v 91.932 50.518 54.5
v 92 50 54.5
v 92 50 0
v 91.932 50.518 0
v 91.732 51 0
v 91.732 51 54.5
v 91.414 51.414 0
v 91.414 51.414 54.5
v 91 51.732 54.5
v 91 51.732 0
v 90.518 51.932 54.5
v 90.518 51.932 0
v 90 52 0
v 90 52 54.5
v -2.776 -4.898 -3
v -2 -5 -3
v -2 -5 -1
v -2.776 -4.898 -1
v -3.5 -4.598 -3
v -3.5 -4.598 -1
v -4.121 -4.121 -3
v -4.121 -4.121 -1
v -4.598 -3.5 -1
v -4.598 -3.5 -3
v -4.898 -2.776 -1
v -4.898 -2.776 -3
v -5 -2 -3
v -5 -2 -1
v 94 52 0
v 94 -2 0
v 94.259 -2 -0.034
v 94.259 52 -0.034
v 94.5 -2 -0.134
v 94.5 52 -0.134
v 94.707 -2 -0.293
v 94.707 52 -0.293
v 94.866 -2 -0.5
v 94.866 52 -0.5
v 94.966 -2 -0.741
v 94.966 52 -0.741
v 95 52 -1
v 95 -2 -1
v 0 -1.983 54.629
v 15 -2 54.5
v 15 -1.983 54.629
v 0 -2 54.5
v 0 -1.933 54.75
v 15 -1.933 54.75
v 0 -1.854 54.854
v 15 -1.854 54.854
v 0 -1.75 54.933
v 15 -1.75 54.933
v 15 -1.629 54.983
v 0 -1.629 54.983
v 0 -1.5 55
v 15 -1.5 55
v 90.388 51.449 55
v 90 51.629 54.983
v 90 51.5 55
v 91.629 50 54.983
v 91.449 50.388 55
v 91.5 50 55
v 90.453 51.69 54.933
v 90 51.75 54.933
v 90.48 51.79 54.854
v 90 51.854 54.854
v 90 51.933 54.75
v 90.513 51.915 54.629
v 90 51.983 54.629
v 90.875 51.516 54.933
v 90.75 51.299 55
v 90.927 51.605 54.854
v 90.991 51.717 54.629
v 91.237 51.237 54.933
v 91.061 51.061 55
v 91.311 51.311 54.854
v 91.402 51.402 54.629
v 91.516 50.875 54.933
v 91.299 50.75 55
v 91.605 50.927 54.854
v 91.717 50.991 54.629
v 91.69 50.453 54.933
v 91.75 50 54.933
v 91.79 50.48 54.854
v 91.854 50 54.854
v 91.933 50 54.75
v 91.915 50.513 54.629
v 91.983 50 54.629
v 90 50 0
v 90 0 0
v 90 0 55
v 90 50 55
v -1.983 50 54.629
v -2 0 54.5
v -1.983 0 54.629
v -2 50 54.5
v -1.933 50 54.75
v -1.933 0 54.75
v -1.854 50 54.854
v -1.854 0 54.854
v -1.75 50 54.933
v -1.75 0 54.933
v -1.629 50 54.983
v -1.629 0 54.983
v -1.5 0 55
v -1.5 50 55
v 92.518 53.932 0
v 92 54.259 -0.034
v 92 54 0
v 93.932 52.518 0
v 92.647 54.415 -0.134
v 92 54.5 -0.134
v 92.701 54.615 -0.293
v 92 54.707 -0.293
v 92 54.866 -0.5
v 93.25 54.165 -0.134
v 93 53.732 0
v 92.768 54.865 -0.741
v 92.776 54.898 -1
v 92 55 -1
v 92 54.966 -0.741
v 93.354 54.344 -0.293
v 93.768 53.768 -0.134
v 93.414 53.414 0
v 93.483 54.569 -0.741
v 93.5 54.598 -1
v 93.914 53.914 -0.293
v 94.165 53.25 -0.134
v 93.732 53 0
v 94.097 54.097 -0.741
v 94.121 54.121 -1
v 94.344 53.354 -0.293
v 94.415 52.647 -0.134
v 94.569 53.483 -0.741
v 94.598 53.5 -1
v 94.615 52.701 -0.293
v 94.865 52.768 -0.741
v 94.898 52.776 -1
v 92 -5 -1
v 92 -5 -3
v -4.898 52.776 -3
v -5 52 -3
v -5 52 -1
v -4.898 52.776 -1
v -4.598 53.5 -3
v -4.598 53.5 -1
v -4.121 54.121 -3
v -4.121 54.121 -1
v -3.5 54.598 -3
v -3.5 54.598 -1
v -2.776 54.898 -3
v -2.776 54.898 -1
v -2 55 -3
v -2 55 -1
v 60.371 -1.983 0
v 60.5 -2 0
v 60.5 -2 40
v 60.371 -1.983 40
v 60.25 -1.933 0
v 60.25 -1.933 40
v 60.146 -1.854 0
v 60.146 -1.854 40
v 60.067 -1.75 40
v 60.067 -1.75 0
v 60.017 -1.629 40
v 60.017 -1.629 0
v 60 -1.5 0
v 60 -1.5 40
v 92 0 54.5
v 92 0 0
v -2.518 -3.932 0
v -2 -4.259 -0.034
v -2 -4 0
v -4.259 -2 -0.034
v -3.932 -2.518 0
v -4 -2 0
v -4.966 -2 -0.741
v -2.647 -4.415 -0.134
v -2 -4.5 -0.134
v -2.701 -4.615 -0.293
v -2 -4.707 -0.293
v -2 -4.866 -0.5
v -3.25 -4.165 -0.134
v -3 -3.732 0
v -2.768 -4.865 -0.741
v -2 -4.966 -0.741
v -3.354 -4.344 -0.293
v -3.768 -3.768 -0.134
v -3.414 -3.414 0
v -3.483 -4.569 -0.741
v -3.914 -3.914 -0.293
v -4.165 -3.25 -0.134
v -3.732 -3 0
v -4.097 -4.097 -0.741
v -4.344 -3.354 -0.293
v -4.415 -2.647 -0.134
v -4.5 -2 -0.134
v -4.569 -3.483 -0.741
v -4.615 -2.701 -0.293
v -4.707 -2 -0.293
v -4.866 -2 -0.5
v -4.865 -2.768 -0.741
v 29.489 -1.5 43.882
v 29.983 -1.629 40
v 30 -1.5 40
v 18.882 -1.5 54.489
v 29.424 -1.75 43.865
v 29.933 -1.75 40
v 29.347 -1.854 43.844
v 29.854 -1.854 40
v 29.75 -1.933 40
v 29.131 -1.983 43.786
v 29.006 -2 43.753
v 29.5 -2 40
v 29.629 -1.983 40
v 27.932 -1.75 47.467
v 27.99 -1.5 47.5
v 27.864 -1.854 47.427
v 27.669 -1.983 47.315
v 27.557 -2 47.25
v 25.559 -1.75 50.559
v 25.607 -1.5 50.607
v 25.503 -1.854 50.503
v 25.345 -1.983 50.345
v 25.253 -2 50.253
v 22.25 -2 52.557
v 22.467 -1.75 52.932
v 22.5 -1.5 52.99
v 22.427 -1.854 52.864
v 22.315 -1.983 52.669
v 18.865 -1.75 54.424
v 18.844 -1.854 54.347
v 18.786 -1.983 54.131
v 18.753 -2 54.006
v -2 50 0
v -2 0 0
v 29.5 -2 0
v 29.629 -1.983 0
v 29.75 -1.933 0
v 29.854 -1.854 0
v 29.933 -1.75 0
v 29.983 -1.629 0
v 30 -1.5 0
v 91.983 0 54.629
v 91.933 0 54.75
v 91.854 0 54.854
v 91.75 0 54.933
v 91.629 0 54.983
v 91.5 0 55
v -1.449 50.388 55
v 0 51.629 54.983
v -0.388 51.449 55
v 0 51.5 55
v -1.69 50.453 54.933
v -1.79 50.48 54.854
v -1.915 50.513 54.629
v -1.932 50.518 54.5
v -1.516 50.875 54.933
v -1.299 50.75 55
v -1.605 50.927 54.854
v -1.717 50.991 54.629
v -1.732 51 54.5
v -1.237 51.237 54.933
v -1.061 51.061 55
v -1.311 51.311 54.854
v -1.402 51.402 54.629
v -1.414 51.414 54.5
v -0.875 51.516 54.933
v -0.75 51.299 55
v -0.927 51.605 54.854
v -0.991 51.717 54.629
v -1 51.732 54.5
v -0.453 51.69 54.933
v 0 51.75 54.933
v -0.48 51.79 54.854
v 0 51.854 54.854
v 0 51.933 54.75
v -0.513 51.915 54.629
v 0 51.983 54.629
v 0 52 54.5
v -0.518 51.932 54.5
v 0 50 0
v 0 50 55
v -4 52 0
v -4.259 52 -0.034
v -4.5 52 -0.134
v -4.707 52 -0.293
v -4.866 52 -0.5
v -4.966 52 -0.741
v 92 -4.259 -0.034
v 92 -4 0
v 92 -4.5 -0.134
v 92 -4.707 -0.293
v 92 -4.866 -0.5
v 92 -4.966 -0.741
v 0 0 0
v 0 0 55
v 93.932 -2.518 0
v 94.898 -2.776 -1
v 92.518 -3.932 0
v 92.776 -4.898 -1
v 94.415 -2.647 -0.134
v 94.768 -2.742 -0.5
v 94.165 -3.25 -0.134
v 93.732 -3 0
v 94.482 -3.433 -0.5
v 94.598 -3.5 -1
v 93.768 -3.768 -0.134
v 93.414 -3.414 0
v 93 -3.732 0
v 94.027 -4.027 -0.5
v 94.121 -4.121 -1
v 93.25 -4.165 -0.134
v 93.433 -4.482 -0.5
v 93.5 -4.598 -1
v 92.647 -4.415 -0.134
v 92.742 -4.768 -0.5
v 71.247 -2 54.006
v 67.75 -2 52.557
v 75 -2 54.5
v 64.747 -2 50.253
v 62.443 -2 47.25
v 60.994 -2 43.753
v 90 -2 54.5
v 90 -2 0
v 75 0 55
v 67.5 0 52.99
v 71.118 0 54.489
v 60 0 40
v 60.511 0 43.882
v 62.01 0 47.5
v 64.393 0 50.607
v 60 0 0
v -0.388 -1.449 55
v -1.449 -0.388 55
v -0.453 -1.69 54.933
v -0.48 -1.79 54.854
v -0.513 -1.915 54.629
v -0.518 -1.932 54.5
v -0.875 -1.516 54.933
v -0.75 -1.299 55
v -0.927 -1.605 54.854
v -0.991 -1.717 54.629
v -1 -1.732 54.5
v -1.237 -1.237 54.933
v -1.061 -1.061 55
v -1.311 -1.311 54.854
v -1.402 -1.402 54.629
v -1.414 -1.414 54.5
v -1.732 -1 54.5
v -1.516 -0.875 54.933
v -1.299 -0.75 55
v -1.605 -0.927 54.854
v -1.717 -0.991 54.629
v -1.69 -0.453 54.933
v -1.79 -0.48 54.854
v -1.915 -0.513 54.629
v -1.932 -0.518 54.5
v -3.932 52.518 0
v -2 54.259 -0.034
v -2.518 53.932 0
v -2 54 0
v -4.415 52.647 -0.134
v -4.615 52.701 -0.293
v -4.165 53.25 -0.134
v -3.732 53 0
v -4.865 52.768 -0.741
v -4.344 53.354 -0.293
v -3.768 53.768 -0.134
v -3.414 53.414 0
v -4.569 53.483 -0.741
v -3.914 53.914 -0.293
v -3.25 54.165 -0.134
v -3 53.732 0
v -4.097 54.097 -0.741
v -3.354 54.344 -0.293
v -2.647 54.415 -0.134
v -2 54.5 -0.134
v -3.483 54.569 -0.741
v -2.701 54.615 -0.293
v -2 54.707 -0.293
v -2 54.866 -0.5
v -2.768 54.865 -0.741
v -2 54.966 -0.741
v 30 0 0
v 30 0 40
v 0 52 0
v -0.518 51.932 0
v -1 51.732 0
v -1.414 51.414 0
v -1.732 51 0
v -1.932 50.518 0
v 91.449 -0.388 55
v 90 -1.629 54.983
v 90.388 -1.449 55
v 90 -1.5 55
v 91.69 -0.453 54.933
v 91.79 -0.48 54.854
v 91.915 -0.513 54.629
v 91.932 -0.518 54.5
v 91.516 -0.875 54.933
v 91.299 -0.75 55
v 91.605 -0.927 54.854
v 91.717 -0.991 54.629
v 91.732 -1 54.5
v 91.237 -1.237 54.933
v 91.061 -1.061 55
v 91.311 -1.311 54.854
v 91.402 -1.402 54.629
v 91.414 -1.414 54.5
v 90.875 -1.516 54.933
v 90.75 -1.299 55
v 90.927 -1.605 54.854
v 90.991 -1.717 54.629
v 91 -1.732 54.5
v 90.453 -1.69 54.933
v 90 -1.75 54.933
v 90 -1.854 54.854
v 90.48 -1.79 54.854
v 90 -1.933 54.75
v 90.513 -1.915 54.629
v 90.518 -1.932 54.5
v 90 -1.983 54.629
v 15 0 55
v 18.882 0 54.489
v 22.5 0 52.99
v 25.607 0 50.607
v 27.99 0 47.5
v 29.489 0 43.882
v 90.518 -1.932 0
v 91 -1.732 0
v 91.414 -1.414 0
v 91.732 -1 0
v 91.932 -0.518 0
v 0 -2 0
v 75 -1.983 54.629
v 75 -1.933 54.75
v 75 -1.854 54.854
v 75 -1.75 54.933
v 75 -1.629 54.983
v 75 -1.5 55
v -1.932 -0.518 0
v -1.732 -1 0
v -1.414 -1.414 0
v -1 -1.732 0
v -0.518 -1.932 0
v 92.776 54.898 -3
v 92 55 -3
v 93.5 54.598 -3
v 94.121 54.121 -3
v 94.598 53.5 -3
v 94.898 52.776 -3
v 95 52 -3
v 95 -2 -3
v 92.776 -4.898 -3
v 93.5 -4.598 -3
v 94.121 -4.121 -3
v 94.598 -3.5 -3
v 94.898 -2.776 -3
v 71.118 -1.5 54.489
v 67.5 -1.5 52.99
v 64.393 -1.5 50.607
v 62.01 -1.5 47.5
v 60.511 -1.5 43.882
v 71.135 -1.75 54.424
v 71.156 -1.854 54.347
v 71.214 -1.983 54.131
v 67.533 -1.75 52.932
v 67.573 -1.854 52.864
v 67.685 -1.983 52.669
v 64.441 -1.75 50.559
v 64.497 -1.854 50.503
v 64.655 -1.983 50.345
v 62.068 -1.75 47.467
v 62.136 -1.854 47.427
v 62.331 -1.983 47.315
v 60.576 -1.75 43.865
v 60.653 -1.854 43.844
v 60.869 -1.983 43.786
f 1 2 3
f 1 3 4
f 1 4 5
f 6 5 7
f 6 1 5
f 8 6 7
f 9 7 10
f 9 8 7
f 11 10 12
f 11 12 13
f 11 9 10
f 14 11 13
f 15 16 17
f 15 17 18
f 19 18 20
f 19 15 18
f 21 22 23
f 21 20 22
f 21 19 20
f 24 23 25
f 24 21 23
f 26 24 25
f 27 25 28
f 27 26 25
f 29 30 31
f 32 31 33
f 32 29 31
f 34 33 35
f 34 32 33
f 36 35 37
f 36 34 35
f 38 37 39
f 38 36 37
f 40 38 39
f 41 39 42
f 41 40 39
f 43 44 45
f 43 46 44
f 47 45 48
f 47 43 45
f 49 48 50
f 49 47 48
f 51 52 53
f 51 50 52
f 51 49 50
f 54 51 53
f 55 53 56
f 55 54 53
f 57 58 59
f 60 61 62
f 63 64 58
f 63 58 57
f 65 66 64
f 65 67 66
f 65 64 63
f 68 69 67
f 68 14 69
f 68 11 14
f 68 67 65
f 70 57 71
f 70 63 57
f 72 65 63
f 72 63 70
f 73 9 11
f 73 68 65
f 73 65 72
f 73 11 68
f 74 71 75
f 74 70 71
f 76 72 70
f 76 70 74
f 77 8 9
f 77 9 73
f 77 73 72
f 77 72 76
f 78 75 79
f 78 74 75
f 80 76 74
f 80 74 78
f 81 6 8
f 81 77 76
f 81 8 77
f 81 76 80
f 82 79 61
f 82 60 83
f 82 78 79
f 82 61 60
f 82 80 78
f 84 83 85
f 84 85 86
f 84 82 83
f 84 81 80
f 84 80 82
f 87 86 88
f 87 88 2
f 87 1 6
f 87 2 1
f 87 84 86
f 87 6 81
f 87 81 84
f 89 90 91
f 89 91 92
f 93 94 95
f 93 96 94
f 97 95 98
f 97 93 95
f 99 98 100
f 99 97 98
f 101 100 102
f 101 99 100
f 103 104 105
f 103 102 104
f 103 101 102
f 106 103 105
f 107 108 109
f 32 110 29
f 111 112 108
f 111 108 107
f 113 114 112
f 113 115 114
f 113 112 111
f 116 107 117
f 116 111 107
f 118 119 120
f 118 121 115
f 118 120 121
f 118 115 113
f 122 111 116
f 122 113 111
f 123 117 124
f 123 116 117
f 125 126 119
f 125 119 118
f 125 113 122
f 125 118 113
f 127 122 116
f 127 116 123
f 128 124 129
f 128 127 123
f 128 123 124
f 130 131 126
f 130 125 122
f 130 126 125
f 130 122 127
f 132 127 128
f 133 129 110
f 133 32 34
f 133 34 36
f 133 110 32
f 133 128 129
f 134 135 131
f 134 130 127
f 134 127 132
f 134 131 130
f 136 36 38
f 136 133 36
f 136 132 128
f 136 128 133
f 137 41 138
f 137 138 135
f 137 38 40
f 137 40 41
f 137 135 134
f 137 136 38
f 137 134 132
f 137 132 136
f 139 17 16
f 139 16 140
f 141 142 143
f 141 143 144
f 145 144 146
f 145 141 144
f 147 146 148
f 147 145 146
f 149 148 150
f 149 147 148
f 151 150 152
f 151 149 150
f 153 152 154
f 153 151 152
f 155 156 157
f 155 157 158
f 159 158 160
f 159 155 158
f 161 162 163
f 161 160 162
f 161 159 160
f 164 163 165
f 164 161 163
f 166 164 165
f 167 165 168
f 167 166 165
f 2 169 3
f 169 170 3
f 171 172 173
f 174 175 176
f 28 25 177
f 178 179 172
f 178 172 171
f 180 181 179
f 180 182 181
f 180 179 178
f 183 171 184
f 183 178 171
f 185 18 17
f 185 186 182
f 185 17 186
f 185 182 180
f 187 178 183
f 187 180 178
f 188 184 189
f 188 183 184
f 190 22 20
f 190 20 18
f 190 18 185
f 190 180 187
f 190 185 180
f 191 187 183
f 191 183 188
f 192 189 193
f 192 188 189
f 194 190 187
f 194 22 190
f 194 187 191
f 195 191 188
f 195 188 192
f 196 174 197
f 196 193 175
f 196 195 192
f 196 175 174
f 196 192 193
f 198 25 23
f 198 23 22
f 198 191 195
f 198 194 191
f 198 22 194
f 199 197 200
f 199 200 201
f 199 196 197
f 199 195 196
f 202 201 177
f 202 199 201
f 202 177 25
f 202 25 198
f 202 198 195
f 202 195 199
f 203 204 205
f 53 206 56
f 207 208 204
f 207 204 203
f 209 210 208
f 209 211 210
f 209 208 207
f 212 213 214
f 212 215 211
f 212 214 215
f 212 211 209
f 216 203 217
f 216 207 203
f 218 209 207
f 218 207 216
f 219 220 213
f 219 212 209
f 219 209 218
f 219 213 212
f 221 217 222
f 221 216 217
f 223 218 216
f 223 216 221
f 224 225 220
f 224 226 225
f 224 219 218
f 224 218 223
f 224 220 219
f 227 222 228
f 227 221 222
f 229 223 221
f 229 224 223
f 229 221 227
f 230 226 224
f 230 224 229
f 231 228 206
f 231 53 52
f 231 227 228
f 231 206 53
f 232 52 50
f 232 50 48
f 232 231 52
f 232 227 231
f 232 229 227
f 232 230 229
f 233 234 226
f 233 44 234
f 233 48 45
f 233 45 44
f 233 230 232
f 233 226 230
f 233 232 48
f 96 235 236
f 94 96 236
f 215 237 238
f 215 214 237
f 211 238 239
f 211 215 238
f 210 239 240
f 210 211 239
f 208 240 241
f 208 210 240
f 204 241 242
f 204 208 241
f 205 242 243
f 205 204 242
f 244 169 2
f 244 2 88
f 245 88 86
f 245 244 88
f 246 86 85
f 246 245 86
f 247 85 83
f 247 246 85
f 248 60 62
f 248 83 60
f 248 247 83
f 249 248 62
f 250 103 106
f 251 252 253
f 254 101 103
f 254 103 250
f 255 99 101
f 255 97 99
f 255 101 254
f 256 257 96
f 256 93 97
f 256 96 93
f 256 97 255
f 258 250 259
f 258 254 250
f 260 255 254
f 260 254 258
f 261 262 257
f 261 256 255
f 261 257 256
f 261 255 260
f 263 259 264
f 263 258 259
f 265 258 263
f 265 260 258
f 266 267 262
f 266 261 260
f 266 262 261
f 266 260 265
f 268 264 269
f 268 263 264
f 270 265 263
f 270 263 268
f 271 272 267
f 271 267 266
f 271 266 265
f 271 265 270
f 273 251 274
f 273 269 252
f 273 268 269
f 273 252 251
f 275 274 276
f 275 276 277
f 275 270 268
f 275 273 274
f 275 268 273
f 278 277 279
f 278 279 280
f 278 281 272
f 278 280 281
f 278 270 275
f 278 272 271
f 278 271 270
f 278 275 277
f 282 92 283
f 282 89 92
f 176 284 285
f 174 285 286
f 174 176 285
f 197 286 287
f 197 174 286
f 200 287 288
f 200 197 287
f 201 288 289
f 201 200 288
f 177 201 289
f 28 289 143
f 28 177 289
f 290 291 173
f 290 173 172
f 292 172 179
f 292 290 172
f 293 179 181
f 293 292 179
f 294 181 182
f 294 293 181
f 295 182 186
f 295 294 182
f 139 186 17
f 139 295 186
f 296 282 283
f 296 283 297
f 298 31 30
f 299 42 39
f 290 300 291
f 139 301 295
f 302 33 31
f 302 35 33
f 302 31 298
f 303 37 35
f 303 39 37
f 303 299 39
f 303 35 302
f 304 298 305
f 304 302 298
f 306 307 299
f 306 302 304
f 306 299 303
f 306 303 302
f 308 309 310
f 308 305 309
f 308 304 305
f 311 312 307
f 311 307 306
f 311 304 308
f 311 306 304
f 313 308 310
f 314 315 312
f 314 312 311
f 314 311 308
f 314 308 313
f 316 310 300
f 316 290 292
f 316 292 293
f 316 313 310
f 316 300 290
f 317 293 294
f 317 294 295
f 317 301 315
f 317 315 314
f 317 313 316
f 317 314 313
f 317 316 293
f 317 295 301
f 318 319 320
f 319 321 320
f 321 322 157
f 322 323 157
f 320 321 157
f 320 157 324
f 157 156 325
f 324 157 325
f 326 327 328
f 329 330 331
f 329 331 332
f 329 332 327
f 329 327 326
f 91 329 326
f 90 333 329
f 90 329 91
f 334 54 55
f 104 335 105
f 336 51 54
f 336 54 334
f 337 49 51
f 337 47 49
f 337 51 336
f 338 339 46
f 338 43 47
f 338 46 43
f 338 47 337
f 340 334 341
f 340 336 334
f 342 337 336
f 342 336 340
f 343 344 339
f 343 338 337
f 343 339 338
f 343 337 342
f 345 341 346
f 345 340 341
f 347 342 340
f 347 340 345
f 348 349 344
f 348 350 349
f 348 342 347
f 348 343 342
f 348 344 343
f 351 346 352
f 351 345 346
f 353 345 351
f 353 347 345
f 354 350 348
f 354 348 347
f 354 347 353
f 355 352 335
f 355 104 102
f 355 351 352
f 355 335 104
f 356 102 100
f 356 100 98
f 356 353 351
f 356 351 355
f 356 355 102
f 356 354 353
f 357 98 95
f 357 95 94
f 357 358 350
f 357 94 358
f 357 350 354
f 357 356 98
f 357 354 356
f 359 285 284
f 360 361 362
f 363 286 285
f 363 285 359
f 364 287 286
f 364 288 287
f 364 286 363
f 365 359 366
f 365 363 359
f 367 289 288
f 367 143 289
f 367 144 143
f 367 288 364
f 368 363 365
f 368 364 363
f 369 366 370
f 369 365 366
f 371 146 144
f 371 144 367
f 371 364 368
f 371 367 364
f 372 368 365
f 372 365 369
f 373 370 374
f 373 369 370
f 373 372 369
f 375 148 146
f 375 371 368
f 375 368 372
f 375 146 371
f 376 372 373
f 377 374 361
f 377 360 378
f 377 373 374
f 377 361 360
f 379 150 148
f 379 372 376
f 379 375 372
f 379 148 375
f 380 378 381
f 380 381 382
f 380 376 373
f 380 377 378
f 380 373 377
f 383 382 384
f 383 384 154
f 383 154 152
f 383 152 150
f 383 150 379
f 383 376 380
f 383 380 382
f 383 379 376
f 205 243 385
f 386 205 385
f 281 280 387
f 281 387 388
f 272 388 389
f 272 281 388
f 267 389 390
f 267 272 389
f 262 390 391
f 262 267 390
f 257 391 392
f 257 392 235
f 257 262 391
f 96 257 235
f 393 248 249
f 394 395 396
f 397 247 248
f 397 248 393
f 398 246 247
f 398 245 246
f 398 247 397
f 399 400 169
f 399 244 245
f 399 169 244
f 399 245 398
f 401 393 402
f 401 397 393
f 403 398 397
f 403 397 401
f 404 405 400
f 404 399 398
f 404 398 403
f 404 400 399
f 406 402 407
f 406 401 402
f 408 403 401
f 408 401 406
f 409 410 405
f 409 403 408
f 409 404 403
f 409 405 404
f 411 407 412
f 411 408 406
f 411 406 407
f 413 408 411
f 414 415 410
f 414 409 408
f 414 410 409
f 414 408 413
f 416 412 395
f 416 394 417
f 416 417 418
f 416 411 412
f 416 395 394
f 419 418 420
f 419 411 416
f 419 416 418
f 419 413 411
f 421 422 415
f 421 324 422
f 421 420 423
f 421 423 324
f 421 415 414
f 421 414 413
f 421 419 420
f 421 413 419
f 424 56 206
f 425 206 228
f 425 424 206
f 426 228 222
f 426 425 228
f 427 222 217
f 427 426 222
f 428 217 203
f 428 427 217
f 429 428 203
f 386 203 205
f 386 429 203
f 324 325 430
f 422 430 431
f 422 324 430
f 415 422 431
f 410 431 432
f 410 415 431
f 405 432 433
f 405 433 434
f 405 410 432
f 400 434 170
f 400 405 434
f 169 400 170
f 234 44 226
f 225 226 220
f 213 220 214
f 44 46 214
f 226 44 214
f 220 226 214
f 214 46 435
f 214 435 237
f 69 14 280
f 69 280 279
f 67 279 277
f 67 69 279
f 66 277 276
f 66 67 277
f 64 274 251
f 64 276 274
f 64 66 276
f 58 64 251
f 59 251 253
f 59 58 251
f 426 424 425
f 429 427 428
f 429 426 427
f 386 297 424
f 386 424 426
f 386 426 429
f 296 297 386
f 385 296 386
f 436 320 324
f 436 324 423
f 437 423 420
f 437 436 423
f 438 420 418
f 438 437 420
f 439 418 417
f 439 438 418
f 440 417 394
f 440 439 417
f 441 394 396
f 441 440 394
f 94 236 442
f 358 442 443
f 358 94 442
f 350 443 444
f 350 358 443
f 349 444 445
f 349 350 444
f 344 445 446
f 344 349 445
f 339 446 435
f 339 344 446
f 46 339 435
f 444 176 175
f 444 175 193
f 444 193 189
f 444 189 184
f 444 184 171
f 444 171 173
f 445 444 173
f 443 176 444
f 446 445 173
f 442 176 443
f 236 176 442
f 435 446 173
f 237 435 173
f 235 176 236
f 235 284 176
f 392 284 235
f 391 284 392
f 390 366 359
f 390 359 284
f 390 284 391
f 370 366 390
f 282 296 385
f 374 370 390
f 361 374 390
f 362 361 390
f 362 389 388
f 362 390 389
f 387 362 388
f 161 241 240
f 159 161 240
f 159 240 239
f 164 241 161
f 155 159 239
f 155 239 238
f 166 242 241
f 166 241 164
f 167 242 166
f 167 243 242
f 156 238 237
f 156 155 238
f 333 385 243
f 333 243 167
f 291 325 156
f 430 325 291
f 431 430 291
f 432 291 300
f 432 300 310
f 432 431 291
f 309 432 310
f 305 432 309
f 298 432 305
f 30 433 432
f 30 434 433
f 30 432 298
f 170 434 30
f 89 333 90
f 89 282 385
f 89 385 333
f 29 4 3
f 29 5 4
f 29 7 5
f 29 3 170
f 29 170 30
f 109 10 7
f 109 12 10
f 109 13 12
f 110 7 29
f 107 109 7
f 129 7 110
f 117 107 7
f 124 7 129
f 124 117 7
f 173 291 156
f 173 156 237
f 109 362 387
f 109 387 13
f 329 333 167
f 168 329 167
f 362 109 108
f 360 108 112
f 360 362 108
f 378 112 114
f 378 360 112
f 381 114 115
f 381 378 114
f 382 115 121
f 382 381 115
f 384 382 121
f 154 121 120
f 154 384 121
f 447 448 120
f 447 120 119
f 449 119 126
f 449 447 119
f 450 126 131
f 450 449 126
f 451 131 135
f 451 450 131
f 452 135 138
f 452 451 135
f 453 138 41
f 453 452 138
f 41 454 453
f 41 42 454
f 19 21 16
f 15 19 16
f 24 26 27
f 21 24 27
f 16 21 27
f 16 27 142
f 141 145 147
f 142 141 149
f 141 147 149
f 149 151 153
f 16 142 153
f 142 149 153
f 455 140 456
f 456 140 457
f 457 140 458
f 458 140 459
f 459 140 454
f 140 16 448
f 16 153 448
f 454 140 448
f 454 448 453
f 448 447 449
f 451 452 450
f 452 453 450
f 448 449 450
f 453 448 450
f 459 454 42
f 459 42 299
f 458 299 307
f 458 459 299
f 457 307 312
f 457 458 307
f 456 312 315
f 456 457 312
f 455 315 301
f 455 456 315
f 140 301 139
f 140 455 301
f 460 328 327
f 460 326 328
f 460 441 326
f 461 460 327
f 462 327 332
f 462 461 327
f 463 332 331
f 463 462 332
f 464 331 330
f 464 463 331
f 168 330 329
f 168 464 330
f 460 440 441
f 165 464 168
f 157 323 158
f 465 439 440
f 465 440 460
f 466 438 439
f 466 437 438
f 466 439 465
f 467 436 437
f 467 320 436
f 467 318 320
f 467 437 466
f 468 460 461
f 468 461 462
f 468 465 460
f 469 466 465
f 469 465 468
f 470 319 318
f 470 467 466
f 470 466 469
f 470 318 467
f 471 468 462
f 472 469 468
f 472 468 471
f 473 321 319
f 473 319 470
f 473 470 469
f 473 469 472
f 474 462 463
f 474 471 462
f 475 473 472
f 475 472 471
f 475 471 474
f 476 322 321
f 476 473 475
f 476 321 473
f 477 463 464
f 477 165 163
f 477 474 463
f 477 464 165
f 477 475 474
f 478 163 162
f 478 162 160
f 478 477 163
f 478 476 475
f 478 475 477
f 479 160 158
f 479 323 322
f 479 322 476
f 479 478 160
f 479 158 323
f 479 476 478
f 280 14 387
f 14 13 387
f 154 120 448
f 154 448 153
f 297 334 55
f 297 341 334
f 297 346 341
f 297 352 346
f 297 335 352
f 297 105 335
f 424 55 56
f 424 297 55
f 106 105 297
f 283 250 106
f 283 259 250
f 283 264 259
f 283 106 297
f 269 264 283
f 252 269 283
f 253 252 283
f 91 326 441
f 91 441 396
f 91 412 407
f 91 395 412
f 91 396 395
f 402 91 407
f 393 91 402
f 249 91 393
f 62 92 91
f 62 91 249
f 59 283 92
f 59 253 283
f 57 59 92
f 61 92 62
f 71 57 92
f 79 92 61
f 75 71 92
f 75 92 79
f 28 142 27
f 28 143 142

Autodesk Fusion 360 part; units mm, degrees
sketch "Sketch1" plane through (0, 0, 0) normal (0, 0, 1) x (1, 0, 0)
  line L0 (0, 0) -> (90, 0)
  line L1 (90, 0) -> (90, 50)
  line L2 (90, 50) -> (0, 50)
  line L3 (0, 50) -> (0, 0)
  line L4 (-2, -2) -> (92, -2)
  line L5 (92, -2) -> (92, 52)
  line L6 (92, 52) -> (-2, 52)
  line L7 (-2, 52) -> (-2, -2)
  line L8 (-5, -5) -> (95, -5)
  line L9 (95, -5) -> (95, 55)
  line L10 (95, 55) -> (-5, 55)
  line L11 (-5, 55) -> (-5, -5)
  line L12 (30, 0) -> (60, 0)
  line L13 (60, 0) -> (60, -2)
  line L14 (60, -2) -> (30, -2)
  line L15 (30, -2) -> (30, 0)
  dimension "d1" = 90
  dimension "d2" = 50
  dimension "d3" = 2
  dimension "d4" = 5
  dimension "d5" = 30
extrude "Extrude1" add sketch "Sketch1" along normal blind 55 contours L0 L1 L2 L3 L4 L5 L6 L7 L13 L15
extrude "Extrude2" add sketch "Sketch1" against normal blind 3 contours L0 L1 L2 L3 L12 | L0 L1 L2 L3 L4 L5 L6 L7 L13 L15 | L0 L4 L12 L13 L14 L15 | L8 L9 L10 L11
fillet "Fillet1" radius 15 2 edges at (30, -1, 55) (60, -1, 55)
fillet "Fillet2" radius 3 4 edges at (-5, -5, -1.5) (95, -5, -1.5) (95, 55, -1.5) (-5, 55, -1.5)
fillet "Fillet3" radius 2 4 edges at (92, -2, 27.5) (92, 52, 27.5) (-2, -2, 27.5) (-2, 52, 27.5)
fillet "Fillet4" radius 0.5 13 edges at (30, -2, 20) (25.6066, -2, 50.6066) (7.5, -2, 55) (-1.4142, -1.4142, 55) (-2, 25, 55) (-1.4142, 51.4142, 55) (45, 52, 55) (91.4142, 51.4142, 55) (92, 25, 55) (91.4142, -1.4142, 55) (82.5, -2, 55) (64.3934, -2, 50.6066) (60, -2, 20)
fillet "Fillet5" radius 1 8 edges at (94.1213, -4.1213, 0) (95, 25, 0) (94.1213, 54.1213, 0) (45, 55, 0) (-4.1213, 54.1213, 0) (-5, 25, 0) (-4.1213, -4.1213, 0) (45, -5, 0)
equation "d1 = base_width"
equation "d2 = base_depth"
equation "d3 = wall_thickness"
equation "d4 = wall_thickness + base_overhang"
equation "d5 = base_width / 3"
equation "d6 = wall_height"
equation "d8 = -( wall_thickness + 1 mm )"
equation "base_width = 90 mm"
equation "base_depth = 50 mm"
equation "wall_height = 55 mm"
equation "wall_thickness = 2 mm"
equation "base_overhang = 3 mm"
